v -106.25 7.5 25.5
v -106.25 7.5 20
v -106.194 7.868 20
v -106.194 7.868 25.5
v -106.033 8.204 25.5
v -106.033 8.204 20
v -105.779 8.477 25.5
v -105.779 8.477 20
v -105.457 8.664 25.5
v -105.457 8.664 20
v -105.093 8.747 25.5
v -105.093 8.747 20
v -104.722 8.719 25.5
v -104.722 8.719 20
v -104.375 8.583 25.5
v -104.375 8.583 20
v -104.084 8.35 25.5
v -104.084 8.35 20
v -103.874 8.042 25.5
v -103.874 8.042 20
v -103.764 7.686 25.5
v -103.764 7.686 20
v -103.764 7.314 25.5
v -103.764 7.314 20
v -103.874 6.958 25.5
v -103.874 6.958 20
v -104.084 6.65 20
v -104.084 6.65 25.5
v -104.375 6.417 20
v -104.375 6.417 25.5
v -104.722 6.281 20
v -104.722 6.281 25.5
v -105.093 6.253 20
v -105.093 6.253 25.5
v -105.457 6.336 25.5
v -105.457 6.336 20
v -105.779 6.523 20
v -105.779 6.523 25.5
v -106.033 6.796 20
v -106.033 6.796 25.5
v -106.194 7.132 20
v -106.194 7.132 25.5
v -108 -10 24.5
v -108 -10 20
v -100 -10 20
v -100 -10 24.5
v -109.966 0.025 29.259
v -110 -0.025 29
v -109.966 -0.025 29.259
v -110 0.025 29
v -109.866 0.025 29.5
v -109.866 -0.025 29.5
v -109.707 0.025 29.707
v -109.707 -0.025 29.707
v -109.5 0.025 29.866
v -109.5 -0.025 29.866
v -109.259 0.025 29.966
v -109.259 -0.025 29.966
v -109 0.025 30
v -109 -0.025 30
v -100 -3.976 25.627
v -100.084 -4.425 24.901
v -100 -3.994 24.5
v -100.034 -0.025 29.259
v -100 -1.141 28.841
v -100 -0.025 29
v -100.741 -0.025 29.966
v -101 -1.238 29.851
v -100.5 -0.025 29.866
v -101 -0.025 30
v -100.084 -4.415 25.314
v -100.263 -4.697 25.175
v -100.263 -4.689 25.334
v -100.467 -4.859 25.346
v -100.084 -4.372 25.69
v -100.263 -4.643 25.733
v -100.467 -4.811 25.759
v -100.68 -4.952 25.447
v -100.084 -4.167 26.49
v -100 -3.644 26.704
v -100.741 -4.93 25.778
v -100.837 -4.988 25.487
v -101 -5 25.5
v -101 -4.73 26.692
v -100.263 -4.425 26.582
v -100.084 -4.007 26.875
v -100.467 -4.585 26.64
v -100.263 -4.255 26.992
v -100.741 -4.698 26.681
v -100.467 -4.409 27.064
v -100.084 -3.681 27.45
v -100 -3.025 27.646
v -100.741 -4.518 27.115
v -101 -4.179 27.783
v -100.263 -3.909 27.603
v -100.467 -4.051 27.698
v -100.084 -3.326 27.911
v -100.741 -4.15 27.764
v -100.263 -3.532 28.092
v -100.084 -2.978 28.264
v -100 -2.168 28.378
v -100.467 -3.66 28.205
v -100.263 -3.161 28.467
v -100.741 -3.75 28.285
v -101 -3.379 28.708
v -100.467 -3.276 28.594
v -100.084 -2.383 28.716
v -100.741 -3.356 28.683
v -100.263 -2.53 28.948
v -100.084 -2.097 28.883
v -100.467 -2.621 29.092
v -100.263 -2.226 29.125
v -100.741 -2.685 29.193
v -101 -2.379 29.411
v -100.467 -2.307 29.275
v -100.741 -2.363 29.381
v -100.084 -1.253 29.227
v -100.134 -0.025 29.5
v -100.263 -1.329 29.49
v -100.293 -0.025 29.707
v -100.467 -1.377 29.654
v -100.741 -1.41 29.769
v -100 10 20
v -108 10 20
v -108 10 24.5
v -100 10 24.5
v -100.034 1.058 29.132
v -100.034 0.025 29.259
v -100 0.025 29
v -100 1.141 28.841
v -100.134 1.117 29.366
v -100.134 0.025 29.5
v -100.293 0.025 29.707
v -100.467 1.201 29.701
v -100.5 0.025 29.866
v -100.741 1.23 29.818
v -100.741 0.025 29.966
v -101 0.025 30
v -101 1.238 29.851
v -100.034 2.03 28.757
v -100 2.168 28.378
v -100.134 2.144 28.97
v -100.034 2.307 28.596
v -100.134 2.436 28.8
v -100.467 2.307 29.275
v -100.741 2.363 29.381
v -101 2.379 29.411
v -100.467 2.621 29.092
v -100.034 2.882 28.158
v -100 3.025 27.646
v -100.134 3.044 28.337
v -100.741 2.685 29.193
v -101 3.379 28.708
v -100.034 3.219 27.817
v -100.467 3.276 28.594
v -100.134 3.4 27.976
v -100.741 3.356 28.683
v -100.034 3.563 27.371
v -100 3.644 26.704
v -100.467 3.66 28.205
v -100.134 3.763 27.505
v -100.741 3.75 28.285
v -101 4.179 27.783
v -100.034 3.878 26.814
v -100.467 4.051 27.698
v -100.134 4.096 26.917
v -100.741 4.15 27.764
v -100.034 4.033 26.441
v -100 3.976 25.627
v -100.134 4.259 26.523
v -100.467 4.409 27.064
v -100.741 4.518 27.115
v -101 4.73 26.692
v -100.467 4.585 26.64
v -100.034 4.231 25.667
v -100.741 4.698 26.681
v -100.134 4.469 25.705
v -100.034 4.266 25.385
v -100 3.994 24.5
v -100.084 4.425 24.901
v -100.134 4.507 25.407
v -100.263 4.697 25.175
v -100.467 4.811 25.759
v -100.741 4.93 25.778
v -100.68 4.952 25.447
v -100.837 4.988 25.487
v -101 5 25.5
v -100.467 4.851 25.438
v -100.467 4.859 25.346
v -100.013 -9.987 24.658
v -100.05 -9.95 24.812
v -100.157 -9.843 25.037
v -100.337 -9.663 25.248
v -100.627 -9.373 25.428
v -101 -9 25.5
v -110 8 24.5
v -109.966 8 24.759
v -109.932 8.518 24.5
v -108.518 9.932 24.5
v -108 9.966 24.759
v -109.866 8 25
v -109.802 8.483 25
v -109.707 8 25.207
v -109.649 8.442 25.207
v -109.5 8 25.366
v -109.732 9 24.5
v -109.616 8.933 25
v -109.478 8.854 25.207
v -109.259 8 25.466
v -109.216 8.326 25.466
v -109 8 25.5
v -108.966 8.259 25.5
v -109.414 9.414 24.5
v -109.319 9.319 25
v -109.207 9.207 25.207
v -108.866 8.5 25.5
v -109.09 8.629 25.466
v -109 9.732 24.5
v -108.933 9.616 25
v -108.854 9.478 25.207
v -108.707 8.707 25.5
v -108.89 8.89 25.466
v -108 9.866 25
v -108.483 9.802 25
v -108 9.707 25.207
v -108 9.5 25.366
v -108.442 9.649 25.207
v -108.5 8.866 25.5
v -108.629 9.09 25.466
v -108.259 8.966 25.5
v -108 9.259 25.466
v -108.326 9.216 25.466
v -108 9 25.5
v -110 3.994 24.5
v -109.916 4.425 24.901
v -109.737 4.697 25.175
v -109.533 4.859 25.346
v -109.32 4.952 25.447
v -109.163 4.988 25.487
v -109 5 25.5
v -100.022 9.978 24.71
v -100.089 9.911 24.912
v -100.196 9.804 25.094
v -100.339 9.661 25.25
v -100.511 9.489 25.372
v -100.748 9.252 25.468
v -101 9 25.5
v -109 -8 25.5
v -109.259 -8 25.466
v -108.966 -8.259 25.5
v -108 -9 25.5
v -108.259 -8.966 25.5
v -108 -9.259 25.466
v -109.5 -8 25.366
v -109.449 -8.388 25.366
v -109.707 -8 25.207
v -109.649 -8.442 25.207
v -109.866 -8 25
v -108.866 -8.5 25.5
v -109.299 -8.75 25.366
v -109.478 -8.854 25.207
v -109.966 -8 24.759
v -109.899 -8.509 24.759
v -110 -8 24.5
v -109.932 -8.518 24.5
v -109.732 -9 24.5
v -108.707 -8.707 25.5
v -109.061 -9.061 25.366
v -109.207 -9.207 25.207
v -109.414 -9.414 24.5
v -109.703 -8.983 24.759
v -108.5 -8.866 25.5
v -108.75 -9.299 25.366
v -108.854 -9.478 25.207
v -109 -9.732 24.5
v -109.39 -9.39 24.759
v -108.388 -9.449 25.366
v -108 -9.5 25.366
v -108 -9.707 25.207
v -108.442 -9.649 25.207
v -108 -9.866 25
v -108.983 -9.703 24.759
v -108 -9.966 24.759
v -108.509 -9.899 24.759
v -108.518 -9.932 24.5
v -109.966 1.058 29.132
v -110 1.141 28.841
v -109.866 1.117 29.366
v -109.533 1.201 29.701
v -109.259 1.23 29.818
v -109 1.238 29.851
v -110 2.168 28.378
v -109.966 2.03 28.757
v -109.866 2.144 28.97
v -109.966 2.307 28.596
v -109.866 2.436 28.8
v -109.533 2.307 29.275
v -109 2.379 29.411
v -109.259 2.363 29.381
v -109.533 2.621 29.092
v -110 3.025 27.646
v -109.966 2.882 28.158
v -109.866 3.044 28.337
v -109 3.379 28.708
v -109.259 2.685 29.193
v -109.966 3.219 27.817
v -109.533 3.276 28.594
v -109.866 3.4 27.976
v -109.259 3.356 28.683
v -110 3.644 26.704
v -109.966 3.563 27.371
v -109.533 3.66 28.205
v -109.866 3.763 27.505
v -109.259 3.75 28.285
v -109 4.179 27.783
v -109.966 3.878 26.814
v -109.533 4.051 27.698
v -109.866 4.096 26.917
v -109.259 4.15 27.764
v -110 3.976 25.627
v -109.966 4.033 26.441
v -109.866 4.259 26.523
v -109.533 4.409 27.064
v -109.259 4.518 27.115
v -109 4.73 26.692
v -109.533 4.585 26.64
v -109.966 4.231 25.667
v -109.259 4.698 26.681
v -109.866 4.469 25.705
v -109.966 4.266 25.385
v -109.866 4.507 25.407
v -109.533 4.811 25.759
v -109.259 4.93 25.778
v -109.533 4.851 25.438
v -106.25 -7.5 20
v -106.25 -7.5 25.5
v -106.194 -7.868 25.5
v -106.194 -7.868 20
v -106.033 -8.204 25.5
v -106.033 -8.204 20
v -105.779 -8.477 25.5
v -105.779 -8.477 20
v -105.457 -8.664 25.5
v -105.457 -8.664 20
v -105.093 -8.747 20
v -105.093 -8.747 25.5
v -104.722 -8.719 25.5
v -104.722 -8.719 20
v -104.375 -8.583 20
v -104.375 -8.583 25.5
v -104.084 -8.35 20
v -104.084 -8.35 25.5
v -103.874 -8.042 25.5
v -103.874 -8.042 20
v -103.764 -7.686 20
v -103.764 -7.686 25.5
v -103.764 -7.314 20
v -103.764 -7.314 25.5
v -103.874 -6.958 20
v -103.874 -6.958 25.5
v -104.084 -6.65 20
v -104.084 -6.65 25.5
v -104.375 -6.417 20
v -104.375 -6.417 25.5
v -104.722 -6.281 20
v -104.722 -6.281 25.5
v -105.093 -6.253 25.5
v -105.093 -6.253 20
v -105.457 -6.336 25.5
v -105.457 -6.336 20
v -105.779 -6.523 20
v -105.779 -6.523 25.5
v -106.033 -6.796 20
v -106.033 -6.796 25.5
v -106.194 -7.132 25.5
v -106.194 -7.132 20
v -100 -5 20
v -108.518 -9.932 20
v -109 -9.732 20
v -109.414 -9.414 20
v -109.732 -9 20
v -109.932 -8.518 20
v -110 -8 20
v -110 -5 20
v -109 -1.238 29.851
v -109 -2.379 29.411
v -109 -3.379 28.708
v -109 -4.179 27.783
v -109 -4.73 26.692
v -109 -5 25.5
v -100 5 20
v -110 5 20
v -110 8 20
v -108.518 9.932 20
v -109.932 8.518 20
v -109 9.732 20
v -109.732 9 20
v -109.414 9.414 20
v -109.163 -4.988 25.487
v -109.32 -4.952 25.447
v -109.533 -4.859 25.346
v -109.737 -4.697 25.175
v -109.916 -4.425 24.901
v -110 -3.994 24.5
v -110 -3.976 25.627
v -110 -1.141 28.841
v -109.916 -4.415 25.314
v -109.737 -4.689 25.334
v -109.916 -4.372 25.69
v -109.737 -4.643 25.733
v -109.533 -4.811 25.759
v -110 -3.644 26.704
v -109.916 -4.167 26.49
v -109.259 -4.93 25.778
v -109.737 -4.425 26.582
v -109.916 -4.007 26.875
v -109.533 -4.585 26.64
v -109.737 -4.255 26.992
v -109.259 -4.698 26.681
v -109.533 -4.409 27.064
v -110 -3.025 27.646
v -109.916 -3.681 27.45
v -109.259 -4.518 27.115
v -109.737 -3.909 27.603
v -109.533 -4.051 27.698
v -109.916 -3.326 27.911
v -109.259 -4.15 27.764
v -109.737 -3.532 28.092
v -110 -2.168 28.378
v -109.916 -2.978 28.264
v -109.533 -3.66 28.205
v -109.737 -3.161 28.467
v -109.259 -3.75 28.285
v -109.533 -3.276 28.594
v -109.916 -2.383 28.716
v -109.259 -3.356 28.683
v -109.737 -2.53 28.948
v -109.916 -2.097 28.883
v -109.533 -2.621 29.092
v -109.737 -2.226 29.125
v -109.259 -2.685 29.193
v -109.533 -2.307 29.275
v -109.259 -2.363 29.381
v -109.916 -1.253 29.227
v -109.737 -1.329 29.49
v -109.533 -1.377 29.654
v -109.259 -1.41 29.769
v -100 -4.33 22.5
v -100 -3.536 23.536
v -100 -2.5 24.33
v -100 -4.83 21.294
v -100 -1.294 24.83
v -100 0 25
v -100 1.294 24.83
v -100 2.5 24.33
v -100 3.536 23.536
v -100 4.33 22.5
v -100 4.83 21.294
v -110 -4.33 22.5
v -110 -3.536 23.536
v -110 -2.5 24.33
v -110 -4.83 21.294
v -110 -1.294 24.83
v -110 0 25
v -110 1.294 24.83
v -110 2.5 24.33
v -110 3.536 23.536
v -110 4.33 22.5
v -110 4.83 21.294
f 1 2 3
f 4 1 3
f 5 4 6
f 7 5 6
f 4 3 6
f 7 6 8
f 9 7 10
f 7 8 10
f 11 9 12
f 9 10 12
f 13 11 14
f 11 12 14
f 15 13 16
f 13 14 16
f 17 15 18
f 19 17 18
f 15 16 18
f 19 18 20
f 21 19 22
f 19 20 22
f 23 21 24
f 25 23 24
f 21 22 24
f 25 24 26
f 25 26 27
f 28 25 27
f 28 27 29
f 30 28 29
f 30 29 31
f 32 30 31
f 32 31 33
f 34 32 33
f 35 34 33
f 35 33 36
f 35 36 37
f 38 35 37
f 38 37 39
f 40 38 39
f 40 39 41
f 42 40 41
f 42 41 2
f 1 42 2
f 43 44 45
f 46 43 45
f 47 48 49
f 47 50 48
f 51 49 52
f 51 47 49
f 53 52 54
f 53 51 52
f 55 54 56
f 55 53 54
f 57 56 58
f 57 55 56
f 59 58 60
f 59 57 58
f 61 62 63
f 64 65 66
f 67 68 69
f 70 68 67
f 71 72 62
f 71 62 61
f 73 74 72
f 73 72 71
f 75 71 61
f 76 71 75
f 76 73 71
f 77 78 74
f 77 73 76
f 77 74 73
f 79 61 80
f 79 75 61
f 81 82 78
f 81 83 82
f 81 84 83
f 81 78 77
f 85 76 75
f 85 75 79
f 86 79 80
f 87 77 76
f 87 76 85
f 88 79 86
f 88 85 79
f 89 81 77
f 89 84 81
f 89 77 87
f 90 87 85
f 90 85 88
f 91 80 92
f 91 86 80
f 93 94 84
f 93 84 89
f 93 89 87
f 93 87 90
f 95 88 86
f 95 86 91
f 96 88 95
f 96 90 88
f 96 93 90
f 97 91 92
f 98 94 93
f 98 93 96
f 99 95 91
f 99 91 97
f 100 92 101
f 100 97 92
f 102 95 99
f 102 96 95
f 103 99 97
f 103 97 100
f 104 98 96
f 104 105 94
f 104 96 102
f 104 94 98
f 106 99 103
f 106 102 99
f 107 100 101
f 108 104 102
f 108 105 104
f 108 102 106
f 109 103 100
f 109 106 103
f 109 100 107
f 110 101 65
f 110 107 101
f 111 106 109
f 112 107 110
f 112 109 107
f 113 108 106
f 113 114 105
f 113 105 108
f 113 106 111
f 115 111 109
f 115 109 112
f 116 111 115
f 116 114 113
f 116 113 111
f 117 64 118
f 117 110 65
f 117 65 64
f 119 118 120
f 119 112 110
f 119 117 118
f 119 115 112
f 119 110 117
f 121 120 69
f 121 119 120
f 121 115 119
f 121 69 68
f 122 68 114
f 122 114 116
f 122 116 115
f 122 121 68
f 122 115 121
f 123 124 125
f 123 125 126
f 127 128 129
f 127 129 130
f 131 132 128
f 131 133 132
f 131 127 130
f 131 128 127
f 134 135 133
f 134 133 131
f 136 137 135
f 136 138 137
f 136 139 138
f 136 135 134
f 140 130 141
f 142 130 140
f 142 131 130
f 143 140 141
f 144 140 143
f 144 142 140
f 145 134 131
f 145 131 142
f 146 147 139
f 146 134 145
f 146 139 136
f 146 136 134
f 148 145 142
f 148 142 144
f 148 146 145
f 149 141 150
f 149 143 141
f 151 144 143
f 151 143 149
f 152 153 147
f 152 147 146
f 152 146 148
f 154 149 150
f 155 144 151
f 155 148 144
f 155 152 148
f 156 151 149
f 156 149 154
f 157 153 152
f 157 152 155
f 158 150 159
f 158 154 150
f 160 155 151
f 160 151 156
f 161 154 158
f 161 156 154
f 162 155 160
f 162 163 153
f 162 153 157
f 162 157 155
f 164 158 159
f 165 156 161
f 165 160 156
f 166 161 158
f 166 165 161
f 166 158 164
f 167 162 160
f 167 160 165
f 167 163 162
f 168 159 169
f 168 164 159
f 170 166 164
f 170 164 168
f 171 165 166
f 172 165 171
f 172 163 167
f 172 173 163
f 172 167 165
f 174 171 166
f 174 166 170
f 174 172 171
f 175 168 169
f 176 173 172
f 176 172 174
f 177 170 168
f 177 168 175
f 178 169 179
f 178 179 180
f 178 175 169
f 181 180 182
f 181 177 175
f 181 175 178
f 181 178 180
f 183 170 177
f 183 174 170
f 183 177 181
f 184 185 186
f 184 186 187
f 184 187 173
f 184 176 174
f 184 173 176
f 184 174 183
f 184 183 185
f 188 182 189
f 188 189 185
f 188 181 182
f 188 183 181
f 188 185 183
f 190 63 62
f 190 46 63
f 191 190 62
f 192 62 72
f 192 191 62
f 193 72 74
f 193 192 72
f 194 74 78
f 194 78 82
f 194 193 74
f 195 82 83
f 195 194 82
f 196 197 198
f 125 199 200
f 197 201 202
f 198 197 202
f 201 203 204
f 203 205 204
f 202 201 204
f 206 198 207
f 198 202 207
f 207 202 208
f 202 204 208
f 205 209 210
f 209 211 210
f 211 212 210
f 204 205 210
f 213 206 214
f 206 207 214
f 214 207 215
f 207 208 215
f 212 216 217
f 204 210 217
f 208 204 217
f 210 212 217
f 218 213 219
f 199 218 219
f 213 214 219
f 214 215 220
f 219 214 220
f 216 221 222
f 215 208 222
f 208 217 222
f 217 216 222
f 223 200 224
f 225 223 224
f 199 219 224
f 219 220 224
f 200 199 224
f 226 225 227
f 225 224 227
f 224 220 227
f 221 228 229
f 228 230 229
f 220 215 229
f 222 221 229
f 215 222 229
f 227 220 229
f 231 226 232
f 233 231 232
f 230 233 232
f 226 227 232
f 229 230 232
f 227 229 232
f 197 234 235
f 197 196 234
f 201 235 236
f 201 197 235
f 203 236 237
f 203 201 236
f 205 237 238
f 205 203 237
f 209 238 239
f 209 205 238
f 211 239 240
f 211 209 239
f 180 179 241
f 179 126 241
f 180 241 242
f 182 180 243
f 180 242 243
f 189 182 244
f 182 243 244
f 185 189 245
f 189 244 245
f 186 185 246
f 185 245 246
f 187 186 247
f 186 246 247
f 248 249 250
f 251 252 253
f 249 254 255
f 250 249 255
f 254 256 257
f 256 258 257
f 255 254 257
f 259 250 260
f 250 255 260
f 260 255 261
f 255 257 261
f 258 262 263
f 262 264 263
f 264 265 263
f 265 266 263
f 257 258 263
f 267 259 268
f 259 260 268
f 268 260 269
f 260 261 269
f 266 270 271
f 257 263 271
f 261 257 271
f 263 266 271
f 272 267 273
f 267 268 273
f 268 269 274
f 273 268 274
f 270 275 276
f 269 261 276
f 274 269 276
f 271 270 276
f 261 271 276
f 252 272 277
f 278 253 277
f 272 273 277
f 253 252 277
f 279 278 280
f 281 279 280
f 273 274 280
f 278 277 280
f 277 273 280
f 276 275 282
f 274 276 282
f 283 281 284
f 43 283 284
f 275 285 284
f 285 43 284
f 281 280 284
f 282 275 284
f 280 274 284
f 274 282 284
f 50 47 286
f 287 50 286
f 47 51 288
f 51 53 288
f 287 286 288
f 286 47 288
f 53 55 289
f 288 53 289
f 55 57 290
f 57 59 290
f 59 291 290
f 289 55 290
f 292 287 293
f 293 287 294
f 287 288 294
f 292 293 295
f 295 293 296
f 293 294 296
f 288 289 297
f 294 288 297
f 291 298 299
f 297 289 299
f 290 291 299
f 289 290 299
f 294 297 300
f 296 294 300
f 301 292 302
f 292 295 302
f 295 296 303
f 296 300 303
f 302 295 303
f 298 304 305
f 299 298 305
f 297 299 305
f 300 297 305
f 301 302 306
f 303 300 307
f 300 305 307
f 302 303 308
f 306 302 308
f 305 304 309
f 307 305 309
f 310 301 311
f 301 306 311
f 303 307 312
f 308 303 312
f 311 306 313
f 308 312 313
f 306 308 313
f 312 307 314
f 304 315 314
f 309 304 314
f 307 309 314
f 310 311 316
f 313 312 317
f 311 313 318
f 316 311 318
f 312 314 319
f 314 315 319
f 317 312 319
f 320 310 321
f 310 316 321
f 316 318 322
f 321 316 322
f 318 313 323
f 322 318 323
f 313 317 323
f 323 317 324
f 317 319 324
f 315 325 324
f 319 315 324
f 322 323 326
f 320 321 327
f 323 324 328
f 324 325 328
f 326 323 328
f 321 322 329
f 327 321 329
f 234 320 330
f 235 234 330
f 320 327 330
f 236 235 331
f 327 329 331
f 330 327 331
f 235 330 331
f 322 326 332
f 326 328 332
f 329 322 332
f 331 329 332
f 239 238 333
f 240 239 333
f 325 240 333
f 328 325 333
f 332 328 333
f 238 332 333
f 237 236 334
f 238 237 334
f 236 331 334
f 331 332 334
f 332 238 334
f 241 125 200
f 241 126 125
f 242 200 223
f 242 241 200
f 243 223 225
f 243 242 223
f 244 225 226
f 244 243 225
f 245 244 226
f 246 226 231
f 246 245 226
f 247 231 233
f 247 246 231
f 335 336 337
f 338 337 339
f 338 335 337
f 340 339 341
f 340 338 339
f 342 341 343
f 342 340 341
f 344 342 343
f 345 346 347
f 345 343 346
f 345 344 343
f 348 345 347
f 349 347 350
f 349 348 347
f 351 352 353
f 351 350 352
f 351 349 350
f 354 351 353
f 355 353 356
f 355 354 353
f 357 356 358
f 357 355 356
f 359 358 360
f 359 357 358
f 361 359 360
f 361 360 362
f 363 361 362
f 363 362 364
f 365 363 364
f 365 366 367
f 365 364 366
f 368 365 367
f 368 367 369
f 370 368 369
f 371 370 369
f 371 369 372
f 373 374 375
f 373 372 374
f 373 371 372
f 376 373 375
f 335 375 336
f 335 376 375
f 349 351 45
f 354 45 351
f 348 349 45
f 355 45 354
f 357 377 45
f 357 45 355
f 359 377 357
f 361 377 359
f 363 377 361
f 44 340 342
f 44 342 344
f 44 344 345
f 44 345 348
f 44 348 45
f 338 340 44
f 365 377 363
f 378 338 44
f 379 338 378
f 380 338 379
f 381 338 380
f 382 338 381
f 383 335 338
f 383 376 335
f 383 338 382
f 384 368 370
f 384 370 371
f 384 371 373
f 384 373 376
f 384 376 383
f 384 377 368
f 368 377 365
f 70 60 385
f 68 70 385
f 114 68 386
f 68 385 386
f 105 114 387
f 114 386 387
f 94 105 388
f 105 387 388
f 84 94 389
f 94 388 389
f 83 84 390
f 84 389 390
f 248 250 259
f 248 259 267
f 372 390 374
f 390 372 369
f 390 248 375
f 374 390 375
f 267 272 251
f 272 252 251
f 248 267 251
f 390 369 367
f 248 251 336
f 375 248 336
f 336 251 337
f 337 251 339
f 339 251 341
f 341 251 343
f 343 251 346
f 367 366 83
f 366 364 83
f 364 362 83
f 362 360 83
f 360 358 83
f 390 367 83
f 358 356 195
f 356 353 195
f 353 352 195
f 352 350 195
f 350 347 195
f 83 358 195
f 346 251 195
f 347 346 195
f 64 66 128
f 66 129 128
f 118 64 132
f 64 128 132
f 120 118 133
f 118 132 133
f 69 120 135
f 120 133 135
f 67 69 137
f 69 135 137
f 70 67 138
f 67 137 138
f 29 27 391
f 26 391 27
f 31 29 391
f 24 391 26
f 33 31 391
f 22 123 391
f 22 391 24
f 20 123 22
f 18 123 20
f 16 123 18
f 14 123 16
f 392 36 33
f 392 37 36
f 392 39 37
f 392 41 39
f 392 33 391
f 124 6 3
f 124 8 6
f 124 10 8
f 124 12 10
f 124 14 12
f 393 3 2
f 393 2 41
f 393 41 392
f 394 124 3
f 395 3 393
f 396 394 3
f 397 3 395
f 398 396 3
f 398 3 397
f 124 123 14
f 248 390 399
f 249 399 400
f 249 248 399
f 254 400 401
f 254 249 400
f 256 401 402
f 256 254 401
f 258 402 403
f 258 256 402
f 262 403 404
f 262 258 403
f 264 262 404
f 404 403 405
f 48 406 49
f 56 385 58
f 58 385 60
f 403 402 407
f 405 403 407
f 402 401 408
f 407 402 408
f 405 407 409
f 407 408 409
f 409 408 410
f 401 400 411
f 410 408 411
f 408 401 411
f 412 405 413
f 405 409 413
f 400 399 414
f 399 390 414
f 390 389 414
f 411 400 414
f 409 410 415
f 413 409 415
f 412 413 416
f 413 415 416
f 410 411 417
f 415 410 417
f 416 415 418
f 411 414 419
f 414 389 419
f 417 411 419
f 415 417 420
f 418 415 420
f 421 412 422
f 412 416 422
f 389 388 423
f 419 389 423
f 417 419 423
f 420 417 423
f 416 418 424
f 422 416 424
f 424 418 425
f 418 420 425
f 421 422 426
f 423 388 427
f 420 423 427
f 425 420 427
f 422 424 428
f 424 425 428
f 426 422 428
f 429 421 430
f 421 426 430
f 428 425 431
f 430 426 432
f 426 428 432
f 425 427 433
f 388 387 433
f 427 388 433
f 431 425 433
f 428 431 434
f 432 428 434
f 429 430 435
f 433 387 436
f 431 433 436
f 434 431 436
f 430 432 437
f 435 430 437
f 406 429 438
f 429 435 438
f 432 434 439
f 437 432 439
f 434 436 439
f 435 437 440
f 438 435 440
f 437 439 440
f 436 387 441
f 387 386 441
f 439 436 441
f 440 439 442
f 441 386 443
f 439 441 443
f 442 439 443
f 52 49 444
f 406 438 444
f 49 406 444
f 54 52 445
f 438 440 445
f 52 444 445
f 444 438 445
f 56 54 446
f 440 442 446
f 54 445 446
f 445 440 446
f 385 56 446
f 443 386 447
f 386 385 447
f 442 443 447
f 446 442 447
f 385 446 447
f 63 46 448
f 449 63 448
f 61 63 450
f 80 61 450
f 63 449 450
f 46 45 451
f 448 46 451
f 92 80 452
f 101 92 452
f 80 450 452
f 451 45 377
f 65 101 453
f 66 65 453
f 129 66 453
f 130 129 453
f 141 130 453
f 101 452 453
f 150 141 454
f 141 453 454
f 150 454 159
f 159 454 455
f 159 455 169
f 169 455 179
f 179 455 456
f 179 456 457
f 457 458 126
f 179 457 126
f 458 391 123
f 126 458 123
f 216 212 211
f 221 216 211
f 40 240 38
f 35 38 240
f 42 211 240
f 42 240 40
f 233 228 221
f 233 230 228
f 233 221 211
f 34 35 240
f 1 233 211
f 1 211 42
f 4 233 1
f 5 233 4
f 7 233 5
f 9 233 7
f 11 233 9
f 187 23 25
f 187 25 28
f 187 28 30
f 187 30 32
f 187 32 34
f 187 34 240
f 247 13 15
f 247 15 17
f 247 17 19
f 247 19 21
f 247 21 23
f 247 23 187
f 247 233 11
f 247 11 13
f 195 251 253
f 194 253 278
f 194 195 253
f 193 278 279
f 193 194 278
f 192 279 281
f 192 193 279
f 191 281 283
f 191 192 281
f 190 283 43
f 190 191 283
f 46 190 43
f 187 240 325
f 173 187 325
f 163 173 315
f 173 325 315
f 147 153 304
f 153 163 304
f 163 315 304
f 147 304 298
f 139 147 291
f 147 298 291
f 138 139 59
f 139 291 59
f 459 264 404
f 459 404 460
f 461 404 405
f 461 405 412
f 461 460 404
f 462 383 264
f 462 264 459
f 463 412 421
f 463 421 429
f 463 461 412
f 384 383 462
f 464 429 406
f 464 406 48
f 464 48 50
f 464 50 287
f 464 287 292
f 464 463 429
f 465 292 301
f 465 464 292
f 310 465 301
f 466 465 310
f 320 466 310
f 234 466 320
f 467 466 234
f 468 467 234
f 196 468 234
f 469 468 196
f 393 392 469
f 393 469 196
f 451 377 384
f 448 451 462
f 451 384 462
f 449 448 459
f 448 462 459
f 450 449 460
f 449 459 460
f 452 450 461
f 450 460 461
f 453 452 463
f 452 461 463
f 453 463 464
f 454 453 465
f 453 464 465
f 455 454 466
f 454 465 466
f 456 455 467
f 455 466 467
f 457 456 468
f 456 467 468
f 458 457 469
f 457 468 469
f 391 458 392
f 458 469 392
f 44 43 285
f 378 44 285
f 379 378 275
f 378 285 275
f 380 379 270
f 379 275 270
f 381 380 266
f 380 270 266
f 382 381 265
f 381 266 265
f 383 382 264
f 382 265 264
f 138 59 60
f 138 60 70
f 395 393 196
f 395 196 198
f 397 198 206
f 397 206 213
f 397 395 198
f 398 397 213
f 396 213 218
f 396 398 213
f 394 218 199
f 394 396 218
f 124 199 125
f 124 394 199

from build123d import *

# Parameters (mm, degrees)
SKETCH3_R                 = 2.75
BOSS_EXTRUDE1_DEPTH       = 6
BOSS_EXTRUDE1_2_DEPTH     = 6
BOSS_EXTRUDE1_3_DEPTH     = 6
BOSS_EXTRUDE1_4_DEPTH     = 6
SKETCH4_W                 = 43
SKETCH4_H                 = 86
BOSS_EXTRUDE2_DEPTH       = 2.5
SKETCH5_R                 = 2.75
BOSS_EXTRUDE3_DEPTH       = 10
LPATTERN1_COUNT           = 2
LPATTERN1_PITCH           = 37
LPATTERN2_COUNT           = 2
LPATTERN2_PITCH           = 37
LPATTERN2_COPY_1_SKETCH_R = 2.75
LPATTERN2_COPY_1_DEPTH    = 10
SKETCH6_W                 = 87
SKETCH6_H                 = 86
BOSS_EXTRUDE4_DEPTH       = 2.5
BOSS_EXTRUDE5_DEPTH       = 2
SKETCH12_W                = 4
SKETCH12_H                = 8
CUT_EXTRUDE1_DEPTH        = 4
SKETCH14_R                = 0.85
CUT_EXTRUDE2_DEPTH        = 4.5
LPATTERN3_COUNT           = 2
LPATTERN3_PITCH           = 46.5
BOSS_EXTRUDE6_DEPTH       = 35
SKETCH18_W                = 2
SKETCH18_H                = 35
BOSS_EXTRUDE7_DEPTH       = 18.5
SKETCH19_W                = 32.48
SKETCH19_H                = 17.04
BOSS_EXTRUDE8_DEPTH       = 10
SKETCH20_W                = 8.16
SKETCH20_H                = 13.04
CUT_EXTRUDE3_DEPTH        = 10
SKETCH21_W                = 1.1
SKETCH21_H                = 86
CUT_EXTRUDE4_DEPTH        = 10
FILLET2_R                 = 2
FILLET4_R                 = 20
BOSS_EXTRUDE9_DEPTH       = 2.5
SKETCH24_W                = 10
SKETCH24_H                = 20
BOSS_EXTRUDE10_DEPTH      = 30
SKETCH25_R                = 5
CUT_EXTRUDE6_DEPTH        = 30
FILLET6_R                 = 10
FILLET8_R                 = 2
SKETCH27_W                = 20
SKETCH27_H                = 20.130693805
CUT_EXTRUDE7_DEPTH        = 22.5
CUT_EXTRUDE10_DEPTH       = 7.5
CUT_EXTRUDE10_DEPTH_BACK  = 210.5
SKETCH28_W                = 79.126815109
SKETCH28_H                = 112.332596714
SKETCH29_R                = 1.25
CUT_EXTRUDE11_DEPTH       = 19.5
SKETCH30_W                = 10
SKETCH30_H                = 5
CUT_EXTRUDE12_DEPTH       = 4.5
FILLET9_R                 = 5
FILLET9_OF_MIRROR5_R      = 5
FILLET11_R                = 1


with BuildPart() as part:
    # Sketch3 → Boss-Extrude1 (new body)
    with BuildSketch(Plane.XY):
        with Locations((-25, -3)):
            Circle(SKETCH3_R)
    boss_extrude1 = extrude(amount=BOSS_EXTRUDE1_DEPTH)



with BuildPart() as body_2:
    # Sketch3 → Boss-Extrude1 2 (new body)
    with BuildSketch(Plane.XY):
        with Locations((-62, -3)):
            Circle(SKETCH3_R)
    boss_extrude1_2 = extrude(amount=BOSS_EXTRUDE1_2_DEPTH)


with BuildPart() as body_3:
    # Sketch3 → Boss-Extrude1 3 (new body)
    with BuildSketch(Plane.XY):
        with Locations(Location((-25, -40, 0), (0, 0, 180))):
            Circle(SKETCH3_R)
    boss_extrude1_3 = extrude(amount=BOSS_EXTRUDE1_3_DEPTH)


with BuildPart() as body_4:
    # Sketch3 → Boss-Extrude1 4 (new body)
    with BuildSketch(Plane.XY):
        with Locations(Location((-62, -40, 0), (0, 0, 180))):
            Circle(SKETCH3_R)
    boss_extrude1_4 = extrude(amount=BOSS_EXTRUDE1_4_DEPTH)


with BuildPart() as part_1:
    add(part.part)

    add(body_2.part)  # Boss-Extrude2 merges body 2

    add(body_3.part)  # Boss-Extrude2 merges body 3

    add(body_4.part)  # Boss-Extrude2 merges body 4
    # Sketch4 → Boss-Extrude2 (add)
    with BuildSketch(Plane.XY):
        with Locations((-43.5, 0)):
            Rectangle(SKETCH4_W, SKETCH4_H)
    extrude(amount=-BOSS_EXTRUDE2_DEPTH)

    # Mirror4: Boss-Extrude1, Boss-Extrude1 2, Boss-Extrude1 3, Boss-Extrude1 4 across plane
    add(boss_extrude1.mirror(Plane.ZX))
    add(boss_extrude1_2.mirror(Plane.ZX))
    add(boss_extrude1_3.mirror(Plane.ZX))
    add(boss_extrude1_4.mirror(Plane.ZX))

    # Sketch5 → Boss-Extrude3 (add)
    with BuildSketch(Plane.XY.offset(6)):
        with Locations((-25, 40)):
            Circle(SKETCH5_R)
    boss_extrude3 = extrude(amount=BOSS_EXTRUDE3_DEPTH)

    # LPattern1: Boss-Extrude3 ×2
    with Locations(*[(-i * LPATTERN1_PITCH, 0, 0) for i in range(1, LPATTERN1_COUNT)]):
        add(boss_extrude3)

    # LPattern2: Boss-Extrude3 ×2
    with Locations(*[(0, -i * LPATTERN2_PITCH, 0) for i in range(1, LPATTERN2_COUNT)]):
        add(boss_extrude3)

    # LPattern2 copy 1 sketch → LPattern2 copy 1 (add)
    with BuildSketch(Plane(origin=(-37, -37, 6), x_dir=(1, 0, 0), z_dir=(0, 0, 1))):
        with Locations((-25, 40)):
            Circle(LPATTERN2_COPY_1_SKETCH_R)
    extrude(amount=LPATTERN2_COPY_1_DEPTH)

    # Sketch6 → Boss-Extrude4 (add)
    with BuildSketch(Plane.XY):
        with Locations((21.5, 0)):
            Rectangle(SKETCH6_W, SKETCH6_H)
    extrude(amount=-BOSS_EXTRUDE4_DEPTH)

    # Sketch11 → Boss-Extrude5 (add, symmetric)
    with BuildSketch(Plane(origin=(-6, 0, 0), x_dir=(0, 0, -1), z_dir=(1, 0, 0))):
        Polygon((0, -43), (-40, -43), (-40, -39), (0, -18), align=None)
    boss_extrude5 = extrude(amount=BOSS_EXTRUDE5_DEPTH, both=True)

    # Sketch12 → Cut-Extrude1 (cut)
    with BuildSketch(Plane.ZY.offset(8)):
        with Locations((8, -32)):
            Rectangle(SKETCH12_W, SKETCH12_H)
    extrude(amount=-CUT_EXTRUDE1_DEPTH, mode=Mode.SUBTRACT)

    # Sketch14 → Cut-Extrude2 (cut)
    with BuildSketch(Plane.XZ.offset(43)):
        with Locations(Location((-6, 37, 0), (0, 0, 270))):
            Circle(SKETCH14_R)
        with Locations(Location((-6, 13.6, 0), (0, 0, 270))):
            Circle(SKETCH14_R)
    cut_extrude2 = extrude(amount=-CUT_EXTRUDE2_DEPTH, mode=Mode.SUBTRACT)

    # LPattern3: Boss-Extrude5, Cut-Extrude2 ×2
    with Locations(*[(i * LPATTERN3_PITCH, 0, 0) for i in range(1, LPATTERN3_COUNT)]):
        add(boss_extrude5)
        add(cut_extrude2, mode=Mode.SUBTRACT)

    # Sketch17 → Boss-Extrude6 (add)
    with BuildSketch(Plane.XY):
        Polygon((42.5, -41), (42.5, -43), (63.9, -43), (63.9, 25.4), (40.5, 25.4), (40.5, -18), (42.5, -18), (42.5, 23.4), (61.9, 23.4), (61.9, -41), align=None)
    extrude(amount=BOSS_EXTRUDE6_DEPTH)

    # Sketch18 → Boss-Extrude7 (add)
    with BuildSketch(Plane.XZ.offset(18)):
        with Locations((41.5, 17.5)):
            Rectangle(SKETCH18_W, SKETCH18_H)
    extrude(amount=BOSS_EXTRUDE7_DEPTH)

    # Sketch19 → Boss-Extrude8 (add)
    with BuildSketch(Plane.XY):
        with Locations((16.24, 8.52)):
            Rectangle(SKETCH19_W, SKETCH19_H)
    extrude(amount=BOSS_EXTRUDE8_DEPTH)

    # Sketch20 → Cut-Extrude3 (cut)
    with BuildSketch(Plane.XY.offset(10)):
        with Locations((6.08, 8.52)):
            Rectangle(SKETCH20_W, SKETCH20_H)
        with Locations((16.24, 8.52)):
            Rectangle(SKETCH20_W, SKETCH20_H)
        with Locations((26.4, 8.52)):
            Rectangle(SKETCH20_W, SKETCH20_H)
    extrude(amount=-CUT_EXTRUDE3_DEPTH, mode=Mode.SUBTRACT)

    # Sketch21 → Cut-Extrude4 (cut)
    with BuildSketch(Plane.XY):
        with Locations((64.45, 0)):
            Rectangle(SKETCH21_W, SKETCH21_H)
    extrude(amount=-CUT_EXTRUDE4_DEPTH, mode=Mode.SUBTRACT)

    # Fillet2
    fillet2_edges = [part_1.edges().sort_by_distance(p)[0] for p in [
        (63.9, -43, 16.25),
        (63.9, 25.4, 17.5),
        (-65, -43, -1.25),
        (-65, 43, -1.25),
    ]]
    fillet(fillet2_edges, radius=FILLET2_R)

    # Fillet4
    fillet4_edges = [part_1.edges().sort_by_distance(p)[0] for p in [
        (63.9, 43, -1.25),
    ]]
    fillet(fillet4_edges, radius=FILLET4_R)

    # Sketch23 → Boss-Extrude9 (add)
    with BuildSketch(Plane(origin=(0, 0, -2.5), x_dir=(-1, 0, 0), z_dir=(0, 0, -1))):
        with BuildLine():
            Line((95.480174176, -10), (105, -10))
            Line((105, -10), (110, -10))
            Line((110, -10), (110, 10))
            Line((110, 10), (105, 10))
            Line((105, 10), (95.480174176, 10))
            add(Edge.make_bspline(
                [(95.480174176, 10), (68.262963787, 8.86232235), (65, 41)],
                knots=[0, 0, 0, 1, 1, 1], degree=2))
            Line((65, 41), (65, -41))
            add(Edge.make_bspline(
                [(95.480174176, -10), (68.262963787, -8.86232235), (65, -41)],
                knots=[0, 0, 0, 1, 1, 1], degree=2))
        make_face()
    extrude(amount=-BOSS_EXTRUDE9_DEPTH)

    # Sketch24 → Boss-Extrude10 (add)
    with BuildSketch(Plane.XY):
        with Locations((-105, 0)):
            Rectangle(SKETCH24_W, SKETCH24_H)
    extrude(amount=BOSS_EXTRUDE10_DEPTH)

    # Sketch25 → Cut-Extrude6 (cut)
    with BuildSketch(Plane.ZY.offset(110)):
        with Locations((20, 0)):
            Circle(SKETCH25_R)
    extrude(amount=-CUT_EXTRUDE6_DEPTH, mode=Mode.SUBTRACT)

    # Fillet6
    fillet6_edges = [part_1.edges().sort_by_distance(p)[0] for p in [
        (-100, 0, 0),
    ]]
    fillet(fillet6_edges, radius=FILLET6_R)

    # Fillet8
    fillet8_edges = [part_1.edges().sort_by_distance(p)[0] for p in [
        (-110, 10, 15),
        (-110, -10, 15),
    ]]
    fillet(fillet8_edges, radius=FILLET8_R)

    # Sketch27 → Cut-Extrude7 (cut)
    with BuildSketch(Plane(origin=(0, 0, -2.5), x_dir=(-1, 0, 0), z_dir=(0, 0, -1))):
        with Locations((100, -0.065346902)):
            Rectangle(SKETCH27_W, SKETCH27_H)
    extrude(amount=-CUT_EXTRUDE7_DEPTH, mode=Mode.SUBTRACT)


with BuildPart() as cut_extrude7_piece_1:
    # of the separate pieces the step leaves, piece 1, a body of its own (cut_extrude7_pieces)
    add(part_1.part.solids().sort_by_distance((-90, -10.130693805, -2.5))[0])

    # Sketch28 → Cut-Extrude10 (cut, two sides: drawn at the far end of the back side and taken through both)
    with BuildSketch(Plane.ZY.offset(90).offset(-CUT_EXTRUDE10_DEPTH_BACK)):
        with Locations((27.34304702, -0.64713832)):
            Rectangle(SKETCH28_W, SKETCH28_H)
    extrude(amount=CUT_EXTRUDE10_DEPTH + CUT_EXTRUDE10_DEPTH_BACK, mode=Mode.SUBTRACT)


with BuildPart() as cut_extrude7_piece_2:
    # of the separate pieces the step leaves, piece 2, a body of its own (cut_extrude7_pieces)
    add(part_1.part.solids().sort_by_distance((-108, 10, 20))[0])

    # Sketch29 → Cut-Extrude11 (cut)
    with BuildSketch(Plane(origin=(0, 0, 20), x_dir=(-1, 0, 0), z_dir=(0, 0, -1))):
        with Locations((105, 7.5)):
            Circle(SKETCH29_R)
    cut_extrude11 = extrude(amount=-CUT_EXTRUDE11_DEPTH, mode=Mode.SUBTRACT)

    # Sketch30 → Cut-Extrude12 (cut)
    with BuildSketch(Plane.XY.offset(30)):
        with Locations((-105, 7.5)):
            Rectangle(SKETCH30_W, SKETCH30_H)
    cut_extrude12 = extrude(amount=-CUT_EXTRUDE12_DEPTH, mode=Mode.SUBTRACT)

    # Fillet9
    # the kernel refuses this fillet: 5 mm, written as the material it takes off along each edge
    with BuildSketch(Plane(origin=(-122.437342964, 5, 30), x_dir=(0, -1, 0), z_dir=(1, 0, 0))) as fillet9_piece_1:
        with BuildLine():
            CenterArc((4.974937186, 5), FILLET9_R, 185.739170477, 84.260829523)
            Line((0, 4.5), (-0.099498744, 4.49))
            ThreePointArc((-0.099498744, 4.49), (-0.1, 2.25), (-0.1, 0))
            Line((-0.1, 0), (0, -0.1))
            Line((0, -0.1), (4.974937186, -0.1))
            Line((4.974937186, -0.1), (4.974937186, 0))
        make_face()
    extrude(amount=34.874685928, mode=Mode.SUBTRACT)

    # Mirror5: Cut-Extrude11, Cut-Extrude12 across plane
    add(cut_extrude11.mirror(Plane.ZX), mode=Mode.SUBTRACT)
    add(cut_extrude12.mirror(Plane.ZX), mode=Mode.SUBTRACT)

    # Fillet9 of Mirror5
    # the kernel refuses this fillet: 5 mm, written as the material it takes off along each edge
    with BuildSketch(Plane(origin=(-122.437342964, -5, 30), x_dir=(0, 0, -1), z_dir=(1, 0, 0))) as fillet9_of_mirror5_piece_1:
        with BuildLine():
            CenterArc((5, 4.974937186), FILLET9_OF_MIRROR5_R, 180, 84.260829523)
            Line((0, 4.974937186), (-0.1, 4.974937186))
            Line((-0.1, 4.974937186), (-0.1, 0))
            Line((-0.1, 0), (0, -0.1))
            ThreePointArc((0, -0.1), (2.25, -0.1), (4.49, -0.099498744))
            Line((4.49, -0.099498744), (4.5, 0))
        make_face()
    extrude(amount=34.874685928, mode=Mode.SUBTRACT)

    # Fillet11
    fillet11_edges = [cut_extrude7_piece_2.edges().sort_by_distance(p)[0] for p in [
        (-104, 10, 25.5),
        (-109.414213562, 9.414213562, 25.5),
        (-110, 6.5, 25.5),
        (-100, 7.5, 25.5),
        (-100, 3.379164781, 28.708099244),
        (-110, 0, 30),
        (-110, 3.379164781, 28.708099244),
        (-109.414213562, -9.414213562, 25.5),
        (-110, -6.5, 25.5),
        (-100, -7.5, 25.5),
        (-104, -10, 25.5),
        (-100, 0, 30),
        (-100, -3.379164781, 28.708099244),
        (-110, -3.379164781, 28.708099244),
    ]]
    fillet(fillet11_edges, radius=FILLET11_R)


solid = cut_extrude7_piece_2.part
